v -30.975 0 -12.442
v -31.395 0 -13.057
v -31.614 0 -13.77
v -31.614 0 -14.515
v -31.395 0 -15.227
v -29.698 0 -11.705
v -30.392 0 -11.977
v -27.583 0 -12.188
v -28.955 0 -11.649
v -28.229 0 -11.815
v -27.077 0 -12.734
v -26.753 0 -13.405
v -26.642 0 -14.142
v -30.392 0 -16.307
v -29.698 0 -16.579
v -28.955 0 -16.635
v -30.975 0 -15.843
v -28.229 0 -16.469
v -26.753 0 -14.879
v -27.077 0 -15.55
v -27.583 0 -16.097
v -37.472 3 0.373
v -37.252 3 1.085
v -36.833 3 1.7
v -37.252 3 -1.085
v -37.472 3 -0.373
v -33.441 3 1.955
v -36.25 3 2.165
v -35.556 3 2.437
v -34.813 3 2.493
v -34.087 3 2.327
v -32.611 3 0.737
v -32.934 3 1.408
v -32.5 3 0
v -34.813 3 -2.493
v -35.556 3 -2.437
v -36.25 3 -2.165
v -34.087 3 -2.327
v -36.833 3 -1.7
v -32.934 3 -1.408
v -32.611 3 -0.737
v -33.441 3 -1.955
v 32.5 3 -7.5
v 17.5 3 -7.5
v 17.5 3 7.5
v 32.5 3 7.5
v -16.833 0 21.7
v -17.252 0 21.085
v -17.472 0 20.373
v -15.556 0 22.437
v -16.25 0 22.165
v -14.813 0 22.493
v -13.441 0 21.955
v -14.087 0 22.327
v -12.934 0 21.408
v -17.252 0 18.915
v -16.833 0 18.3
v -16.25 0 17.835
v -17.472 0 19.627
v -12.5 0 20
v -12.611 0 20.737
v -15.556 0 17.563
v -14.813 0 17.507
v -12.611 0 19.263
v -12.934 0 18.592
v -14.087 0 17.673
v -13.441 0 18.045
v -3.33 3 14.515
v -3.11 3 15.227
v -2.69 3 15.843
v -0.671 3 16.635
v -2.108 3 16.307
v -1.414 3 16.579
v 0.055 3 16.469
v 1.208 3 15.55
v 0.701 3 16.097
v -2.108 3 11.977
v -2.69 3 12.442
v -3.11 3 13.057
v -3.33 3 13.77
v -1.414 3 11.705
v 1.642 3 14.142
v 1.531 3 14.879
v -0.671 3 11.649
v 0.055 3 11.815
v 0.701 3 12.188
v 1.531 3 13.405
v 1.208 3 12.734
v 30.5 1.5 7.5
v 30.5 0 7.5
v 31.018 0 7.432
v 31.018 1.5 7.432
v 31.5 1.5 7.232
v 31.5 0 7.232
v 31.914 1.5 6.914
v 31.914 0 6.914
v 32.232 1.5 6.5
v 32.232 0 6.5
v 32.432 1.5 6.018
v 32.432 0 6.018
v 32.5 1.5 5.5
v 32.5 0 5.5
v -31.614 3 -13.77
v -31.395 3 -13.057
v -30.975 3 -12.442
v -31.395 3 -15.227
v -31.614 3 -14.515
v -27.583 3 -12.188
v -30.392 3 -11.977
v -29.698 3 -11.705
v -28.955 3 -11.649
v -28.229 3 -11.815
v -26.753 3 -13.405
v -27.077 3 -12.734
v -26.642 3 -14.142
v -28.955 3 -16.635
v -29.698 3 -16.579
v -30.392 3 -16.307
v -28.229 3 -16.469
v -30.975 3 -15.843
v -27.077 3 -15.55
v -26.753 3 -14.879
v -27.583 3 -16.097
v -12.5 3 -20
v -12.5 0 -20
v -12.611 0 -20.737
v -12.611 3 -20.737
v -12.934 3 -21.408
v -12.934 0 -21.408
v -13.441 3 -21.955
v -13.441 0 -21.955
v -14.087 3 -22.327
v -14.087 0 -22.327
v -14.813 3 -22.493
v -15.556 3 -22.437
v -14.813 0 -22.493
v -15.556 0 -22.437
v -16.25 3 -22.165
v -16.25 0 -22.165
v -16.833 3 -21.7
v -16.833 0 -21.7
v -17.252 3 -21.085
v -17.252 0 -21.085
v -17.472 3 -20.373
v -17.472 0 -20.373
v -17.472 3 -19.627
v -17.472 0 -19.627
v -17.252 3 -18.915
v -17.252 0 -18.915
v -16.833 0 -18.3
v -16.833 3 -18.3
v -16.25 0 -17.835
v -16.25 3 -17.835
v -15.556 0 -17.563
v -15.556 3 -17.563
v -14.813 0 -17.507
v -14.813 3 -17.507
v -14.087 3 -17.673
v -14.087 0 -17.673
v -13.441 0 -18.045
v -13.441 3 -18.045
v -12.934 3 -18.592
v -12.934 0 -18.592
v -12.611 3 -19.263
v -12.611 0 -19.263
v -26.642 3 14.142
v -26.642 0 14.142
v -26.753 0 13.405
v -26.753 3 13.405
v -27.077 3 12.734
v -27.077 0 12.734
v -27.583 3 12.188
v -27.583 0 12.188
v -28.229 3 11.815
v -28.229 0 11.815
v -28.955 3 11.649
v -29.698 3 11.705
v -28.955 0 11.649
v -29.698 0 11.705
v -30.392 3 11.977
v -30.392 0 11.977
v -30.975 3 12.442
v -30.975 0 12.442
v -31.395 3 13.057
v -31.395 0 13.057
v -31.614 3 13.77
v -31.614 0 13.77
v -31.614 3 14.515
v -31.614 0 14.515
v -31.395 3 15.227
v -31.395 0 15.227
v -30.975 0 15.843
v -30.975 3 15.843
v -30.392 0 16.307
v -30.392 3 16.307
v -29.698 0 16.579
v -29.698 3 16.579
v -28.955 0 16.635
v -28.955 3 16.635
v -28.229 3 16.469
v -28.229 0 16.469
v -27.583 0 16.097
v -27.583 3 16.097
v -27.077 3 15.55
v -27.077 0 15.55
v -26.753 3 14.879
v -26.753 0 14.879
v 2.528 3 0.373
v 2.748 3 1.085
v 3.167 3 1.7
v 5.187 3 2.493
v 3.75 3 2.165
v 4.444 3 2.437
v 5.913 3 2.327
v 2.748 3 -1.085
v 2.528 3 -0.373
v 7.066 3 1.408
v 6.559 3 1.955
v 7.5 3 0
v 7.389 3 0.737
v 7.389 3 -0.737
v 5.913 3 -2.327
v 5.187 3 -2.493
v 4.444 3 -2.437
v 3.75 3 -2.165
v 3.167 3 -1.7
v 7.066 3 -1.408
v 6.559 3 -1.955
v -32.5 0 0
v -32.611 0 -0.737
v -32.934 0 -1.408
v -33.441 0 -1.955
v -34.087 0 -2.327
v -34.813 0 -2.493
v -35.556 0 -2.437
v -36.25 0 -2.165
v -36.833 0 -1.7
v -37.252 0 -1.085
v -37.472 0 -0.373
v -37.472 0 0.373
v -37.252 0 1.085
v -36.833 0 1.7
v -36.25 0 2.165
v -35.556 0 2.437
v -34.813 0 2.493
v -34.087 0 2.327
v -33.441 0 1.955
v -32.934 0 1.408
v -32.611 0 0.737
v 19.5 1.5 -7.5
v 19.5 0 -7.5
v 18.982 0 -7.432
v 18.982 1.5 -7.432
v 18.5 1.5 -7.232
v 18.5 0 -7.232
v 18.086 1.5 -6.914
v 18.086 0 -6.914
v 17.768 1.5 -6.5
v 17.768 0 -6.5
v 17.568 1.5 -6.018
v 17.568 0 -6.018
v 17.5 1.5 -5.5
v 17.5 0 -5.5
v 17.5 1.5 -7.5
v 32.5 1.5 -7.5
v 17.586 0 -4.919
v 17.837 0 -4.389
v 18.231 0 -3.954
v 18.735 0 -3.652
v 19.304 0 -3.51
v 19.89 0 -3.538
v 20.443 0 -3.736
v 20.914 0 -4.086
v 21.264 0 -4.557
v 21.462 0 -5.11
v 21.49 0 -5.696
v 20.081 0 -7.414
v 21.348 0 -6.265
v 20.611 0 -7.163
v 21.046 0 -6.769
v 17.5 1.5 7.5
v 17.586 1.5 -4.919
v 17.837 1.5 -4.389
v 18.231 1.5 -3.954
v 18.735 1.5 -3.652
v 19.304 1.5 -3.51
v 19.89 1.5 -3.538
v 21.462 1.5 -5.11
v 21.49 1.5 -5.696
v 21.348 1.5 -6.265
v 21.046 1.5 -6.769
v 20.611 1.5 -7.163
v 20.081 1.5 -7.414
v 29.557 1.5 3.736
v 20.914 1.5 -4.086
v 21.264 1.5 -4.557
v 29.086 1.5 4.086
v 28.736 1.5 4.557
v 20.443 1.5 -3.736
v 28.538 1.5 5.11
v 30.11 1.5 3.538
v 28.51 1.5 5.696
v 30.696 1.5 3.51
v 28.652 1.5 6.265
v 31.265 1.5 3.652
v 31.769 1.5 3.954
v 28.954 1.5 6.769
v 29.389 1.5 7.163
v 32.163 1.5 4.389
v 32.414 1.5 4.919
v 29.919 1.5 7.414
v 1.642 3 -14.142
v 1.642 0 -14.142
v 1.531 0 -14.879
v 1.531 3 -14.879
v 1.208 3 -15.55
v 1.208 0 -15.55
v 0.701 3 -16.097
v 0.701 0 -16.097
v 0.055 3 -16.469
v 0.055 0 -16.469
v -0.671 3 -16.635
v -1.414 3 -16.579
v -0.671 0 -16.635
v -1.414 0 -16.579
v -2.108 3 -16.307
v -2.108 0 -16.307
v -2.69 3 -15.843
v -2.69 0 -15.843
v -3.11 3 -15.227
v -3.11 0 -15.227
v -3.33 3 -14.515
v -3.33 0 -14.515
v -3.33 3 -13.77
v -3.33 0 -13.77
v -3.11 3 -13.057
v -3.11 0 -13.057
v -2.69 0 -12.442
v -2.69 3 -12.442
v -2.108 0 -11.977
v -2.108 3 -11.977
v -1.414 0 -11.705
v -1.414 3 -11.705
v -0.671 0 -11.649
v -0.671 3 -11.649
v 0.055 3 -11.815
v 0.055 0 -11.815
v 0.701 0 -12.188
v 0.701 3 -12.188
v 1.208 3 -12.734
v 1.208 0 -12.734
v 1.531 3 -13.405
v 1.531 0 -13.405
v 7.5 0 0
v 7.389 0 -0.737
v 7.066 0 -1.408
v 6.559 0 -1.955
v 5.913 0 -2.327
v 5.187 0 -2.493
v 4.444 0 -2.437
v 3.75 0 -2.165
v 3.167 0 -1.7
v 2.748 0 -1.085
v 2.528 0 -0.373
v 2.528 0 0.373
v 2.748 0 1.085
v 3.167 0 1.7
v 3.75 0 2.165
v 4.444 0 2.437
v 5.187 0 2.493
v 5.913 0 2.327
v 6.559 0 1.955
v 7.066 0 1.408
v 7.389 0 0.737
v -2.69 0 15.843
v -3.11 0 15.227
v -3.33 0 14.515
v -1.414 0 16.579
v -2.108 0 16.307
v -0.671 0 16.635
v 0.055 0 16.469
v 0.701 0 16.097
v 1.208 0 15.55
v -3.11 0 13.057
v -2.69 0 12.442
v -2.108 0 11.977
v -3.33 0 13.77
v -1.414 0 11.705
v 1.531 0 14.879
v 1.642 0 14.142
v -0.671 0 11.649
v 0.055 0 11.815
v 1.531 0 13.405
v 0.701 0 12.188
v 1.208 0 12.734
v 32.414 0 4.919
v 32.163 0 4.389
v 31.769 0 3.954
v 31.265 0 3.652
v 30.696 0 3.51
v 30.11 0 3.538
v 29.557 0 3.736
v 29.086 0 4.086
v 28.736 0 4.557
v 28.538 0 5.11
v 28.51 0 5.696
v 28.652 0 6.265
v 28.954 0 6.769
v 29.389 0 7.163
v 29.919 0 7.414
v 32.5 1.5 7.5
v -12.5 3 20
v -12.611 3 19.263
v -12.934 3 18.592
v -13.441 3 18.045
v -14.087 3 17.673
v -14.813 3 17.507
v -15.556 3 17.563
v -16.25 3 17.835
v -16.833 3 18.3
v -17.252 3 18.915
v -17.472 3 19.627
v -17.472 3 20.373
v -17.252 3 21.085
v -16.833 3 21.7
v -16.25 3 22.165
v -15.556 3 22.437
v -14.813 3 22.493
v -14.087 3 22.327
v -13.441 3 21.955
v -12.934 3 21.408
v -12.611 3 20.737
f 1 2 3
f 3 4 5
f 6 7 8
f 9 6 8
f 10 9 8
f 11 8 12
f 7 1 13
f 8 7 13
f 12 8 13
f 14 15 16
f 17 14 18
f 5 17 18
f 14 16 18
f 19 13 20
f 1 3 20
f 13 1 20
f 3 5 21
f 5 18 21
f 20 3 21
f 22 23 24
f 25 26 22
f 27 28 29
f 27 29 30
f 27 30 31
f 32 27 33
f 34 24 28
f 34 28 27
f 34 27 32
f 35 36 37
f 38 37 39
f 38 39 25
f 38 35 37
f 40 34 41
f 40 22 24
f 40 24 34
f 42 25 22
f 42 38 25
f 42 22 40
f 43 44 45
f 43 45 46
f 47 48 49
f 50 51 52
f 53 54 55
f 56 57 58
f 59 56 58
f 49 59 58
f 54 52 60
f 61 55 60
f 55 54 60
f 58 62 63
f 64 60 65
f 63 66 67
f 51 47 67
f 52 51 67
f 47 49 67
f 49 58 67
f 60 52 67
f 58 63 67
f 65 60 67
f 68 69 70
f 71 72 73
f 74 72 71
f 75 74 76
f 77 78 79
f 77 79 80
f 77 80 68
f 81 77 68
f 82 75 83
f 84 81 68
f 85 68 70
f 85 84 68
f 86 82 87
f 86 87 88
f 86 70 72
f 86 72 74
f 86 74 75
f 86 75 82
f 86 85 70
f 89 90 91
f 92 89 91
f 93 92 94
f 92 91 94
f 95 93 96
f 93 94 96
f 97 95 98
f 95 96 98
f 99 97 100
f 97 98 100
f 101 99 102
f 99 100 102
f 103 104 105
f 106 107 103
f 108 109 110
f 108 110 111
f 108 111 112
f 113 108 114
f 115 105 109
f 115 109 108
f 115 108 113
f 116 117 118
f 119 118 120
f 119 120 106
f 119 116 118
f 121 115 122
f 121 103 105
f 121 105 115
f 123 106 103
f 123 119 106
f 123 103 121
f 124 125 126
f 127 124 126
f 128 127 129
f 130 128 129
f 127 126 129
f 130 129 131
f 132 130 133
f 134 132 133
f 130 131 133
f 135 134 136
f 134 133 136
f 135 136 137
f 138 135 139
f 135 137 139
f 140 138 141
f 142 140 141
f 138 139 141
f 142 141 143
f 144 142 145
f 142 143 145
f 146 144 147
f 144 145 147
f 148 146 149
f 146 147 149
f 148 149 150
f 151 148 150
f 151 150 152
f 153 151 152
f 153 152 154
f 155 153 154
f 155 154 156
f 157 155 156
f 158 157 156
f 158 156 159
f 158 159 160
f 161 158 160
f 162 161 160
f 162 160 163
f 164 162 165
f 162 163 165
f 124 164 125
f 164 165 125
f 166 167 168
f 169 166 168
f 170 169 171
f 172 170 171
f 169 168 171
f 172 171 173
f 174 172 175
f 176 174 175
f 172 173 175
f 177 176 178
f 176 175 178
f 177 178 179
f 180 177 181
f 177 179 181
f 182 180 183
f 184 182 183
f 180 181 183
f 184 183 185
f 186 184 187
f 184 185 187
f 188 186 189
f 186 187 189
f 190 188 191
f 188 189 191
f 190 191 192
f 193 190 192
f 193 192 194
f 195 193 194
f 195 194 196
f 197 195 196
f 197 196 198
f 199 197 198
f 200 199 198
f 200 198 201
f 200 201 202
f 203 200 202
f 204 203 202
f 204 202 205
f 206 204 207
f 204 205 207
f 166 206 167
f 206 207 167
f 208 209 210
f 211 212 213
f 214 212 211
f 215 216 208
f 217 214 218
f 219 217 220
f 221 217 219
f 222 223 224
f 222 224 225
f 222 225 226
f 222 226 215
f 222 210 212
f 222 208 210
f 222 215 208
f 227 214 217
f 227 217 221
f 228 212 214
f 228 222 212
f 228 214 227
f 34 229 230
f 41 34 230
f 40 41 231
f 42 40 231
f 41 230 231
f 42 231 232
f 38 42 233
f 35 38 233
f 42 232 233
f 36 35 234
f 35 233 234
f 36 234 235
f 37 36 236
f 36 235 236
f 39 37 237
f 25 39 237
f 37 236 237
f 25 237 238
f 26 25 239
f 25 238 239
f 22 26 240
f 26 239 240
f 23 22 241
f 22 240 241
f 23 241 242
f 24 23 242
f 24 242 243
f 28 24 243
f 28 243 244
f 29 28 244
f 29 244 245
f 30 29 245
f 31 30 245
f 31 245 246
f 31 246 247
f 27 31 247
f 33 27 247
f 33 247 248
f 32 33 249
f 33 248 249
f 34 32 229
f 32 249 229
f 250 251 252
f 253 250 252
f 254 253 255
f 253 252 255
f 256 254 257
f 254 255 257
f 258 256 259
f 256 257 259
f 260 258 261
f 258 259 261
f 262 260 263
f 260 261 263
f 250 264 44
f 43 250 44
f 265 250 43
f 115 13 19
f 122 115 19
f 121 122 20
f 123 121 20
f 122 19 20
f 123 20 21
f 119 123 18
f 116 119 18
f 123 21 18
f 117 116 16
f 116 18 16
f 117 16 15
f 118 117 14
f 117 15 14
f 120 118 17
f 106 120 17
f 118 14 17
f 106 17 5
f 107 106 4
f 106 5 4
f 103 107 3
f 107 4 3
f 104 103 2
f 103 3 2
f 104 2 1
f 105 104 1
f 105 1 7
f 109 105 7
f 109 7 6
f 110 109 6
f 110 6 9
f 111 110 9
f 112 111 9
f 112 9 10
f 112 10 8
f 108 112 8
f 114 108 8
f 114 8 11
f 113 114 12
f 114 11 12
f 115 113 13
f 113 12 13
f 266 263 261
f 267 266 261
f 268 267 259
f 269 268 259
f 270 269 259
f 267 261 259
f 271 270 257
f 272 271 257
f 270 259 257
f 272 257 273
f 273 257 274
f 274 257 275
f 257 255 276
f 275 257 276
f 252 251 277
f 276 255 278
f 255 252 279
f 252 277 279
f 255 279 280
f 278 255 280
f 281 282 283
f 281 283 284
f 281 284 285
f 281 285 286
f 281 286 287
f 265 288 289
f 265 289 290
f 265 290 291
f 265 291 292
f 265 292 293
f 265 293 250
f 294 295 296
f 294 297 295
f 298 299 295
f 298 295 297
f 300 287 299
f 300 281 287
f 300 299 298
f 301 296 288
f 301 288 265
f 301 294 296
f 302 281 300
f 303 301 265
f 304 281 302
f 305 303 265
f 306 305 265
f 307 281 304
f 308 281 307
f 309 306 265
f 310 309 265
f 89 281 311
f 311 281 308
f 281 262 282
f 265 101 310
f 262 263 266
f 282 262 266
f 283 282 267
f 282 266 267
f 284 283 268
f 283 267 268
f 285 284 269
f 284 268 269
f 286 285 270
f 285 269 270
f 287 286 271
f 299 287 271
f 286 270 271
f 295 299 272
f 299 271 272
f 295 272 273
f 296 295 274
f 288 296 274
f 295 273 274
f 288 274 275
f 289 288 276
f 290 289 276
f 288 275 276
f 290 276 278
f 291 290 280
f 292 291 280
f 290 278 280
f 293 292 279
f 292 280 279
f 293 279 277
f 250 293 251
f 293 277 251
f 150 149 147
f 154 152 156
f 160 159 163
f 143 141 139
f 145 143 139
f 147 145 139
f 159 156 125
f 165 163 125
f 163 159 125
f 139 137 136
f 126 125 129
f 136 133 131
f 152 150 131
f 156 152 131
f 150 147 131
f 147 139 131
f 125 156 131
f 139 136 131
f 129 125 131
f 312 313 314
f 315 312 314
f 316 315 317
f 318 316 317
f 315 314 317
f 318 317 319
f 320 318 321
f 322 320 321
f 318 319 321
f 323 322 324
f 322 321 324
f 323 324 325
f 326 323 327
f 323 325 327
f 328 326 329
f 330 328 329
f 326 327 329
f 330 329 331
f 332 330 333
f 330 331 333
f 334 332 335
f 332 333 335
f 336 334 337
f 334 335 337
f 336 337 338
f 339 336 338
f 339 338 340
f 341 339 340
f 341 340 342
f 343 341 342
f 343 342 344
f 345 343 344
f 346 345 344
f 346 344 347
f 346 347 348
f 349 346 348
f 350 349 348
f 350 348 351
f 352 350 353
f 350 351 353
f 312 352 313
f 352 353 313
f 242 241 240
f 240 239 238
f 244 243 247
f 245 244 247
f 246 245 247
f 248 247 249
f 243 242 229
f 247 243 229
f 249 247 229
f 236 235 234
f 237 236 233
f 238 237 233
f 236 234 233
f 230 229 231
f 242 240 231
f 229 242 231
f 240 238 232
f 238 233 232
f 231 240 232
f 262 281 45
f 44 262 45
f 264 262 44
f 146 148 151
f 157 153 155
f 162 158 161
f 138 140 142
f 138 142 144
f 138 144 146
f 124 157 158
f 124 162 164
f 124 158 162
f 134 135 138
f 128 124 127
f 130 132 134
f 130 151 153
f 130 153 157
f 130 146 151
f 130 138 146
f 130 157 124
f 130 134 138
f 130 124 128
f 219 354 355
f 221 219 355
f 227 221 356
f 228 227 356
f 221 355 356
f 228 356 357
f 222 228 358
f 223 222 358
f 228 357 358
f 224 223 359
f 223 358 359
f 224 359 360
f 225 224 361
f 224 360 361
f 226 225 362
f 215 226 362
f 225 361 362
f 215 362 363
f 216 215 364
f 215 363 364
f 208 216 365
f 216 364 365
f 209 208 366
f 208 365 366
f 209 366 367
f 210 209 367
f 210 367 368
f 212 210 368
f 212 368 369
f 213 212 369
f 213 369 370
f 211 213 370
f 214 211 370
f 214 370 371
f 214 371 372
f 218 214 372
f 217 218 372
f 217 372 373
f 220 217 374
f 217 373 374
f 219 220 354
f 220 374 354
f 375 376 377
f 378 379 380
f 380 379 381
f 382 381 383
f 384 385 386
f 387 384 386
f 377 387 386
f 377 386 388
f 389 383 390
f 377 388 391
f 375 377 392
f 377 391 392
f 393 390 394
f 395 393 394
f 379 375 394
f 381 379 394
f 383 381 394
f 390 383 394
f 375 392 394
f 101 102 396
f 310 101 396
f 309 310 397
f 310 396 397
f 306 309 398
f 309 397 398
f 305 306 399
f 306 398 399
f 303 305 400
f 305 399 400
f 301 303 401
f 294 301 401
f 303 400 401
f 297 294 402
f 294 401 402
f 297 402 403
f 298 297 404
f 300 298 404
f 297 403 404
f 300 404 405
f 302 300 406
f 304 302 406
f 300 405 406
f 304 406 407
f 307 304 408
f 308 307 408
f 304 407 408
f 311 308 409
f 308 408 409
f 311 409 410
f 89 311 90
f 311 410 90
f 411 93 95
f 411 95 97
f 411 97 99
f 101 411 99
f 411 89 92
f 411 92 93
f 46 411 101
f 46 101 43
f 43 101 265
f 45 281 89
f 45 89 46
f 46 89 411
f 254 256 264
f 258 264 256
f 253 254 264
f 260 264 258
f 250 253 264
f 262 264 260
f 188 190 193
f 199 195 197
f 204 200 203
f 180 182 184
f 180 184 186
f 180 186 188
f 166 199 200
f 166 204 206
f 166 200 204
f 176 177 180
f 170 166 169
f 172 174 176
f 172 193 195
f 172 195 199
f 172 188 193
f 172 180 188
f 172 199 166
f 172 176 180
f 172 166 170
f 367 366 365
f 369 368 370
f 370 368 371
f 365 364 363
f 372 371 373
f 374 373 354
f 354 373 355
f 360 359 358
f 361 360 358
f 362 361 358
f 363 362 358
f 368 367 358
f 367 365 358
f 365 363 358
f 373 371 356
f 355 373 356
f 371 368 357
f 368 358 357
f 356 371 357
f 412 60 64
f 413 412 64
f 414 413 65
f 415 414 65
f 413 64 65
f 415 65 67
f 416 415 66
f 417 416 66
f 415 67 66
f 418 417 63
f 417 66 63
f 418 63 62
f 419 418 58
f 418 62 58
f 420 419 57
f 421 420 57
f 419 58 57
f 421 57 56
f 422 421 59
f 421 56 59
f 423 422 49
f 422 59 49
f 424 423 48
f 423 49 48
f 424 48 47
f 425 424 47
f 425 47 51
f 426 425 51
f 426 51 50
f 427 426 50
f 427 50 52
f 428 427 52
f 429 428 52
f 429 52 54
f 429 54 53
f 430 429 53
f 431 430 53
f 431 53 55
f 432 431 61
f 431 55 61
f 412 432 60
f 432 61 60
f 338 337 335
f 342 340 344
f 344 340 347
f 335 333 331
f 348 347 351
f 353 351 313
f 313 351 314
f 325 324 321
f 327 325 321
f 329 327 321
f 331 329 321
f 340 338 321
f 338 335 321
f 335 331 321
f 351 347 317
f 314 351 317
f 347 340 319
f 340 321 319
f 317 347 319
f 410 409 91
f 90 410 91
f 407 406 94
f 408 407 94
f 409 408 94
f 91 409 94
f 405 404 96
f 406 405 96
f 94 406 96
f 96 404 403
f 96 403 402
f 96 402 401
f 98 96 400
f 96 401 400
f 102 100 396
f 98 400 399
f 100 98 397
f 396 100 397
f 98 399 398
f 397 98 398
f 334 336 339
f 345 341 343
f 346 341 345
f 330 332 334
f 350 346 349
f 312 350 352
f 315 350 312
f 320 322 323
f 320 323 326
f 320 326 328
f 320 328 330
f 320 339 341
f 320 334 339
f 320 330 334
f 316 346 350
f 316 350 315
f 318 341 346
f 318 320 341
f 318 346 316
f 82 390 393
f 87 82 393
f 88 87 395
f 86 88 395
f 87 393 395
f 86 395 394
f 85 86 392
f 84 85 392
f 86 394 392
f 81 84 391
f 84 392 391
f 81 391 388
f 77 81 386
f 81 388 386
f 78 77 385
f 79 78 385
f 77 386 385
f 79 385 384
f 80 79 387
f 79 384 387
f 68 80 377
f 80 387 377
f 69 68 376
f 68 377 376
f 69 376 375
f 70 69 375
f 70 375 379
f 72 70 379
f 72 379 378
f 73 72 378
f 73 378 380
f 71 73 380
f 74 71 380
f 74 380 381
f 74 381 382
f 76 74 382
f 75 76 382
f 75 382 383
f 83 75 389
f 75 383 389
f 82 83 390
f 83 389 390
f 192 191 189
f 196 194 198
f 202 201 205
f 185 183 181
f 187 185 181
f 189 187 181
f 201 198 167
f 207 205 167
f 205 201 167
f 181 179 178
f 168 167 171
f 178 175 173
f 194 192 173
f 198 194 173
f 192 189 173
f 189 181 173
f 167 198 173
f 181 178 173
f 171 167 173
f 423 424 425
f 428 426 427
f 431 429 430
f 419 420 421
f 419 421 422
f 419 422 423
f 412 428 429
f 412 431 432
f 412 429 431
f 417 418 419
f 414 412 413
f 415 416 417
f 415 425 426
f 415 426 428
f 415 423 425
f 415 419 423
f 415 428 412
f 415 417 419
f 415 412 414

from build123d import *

# Parameters (mm, degrees)
SKETCH1_R             = 2.5
BOSS_EXTRUDE3_DEPTH   = 3
BOSS_EXTRUDE3_2_DEPTH = 3
BOSS_EXTRUDE3_3_DEPTH = 3
BOSS_EXTRUDE3_4_DEPTH = 3
BOSS_EXTRUDE3_5_DEPTH = 3
BOSS_EXTRUDE3_6_DEPTH = 3
BOSS_EXTRUDE3_7_DEPTH = 3
BOSS_EXTRUDE3_8_DEPTH = 3
SKETCH1_W             = 15
SKETCH1_H             = 15
BOSS_EXTRUDE3_9_DEPTH = 3
CUT_EXTRUDE1_DEPTH    = 1.5
CUT_EXTRUDE3_DEPTH    = 1.5


with BuildPart() as part:
    # Sketch1 → Boss-Extrude3 (new body)
    with BuildSketch(Plane(origin=(0, 0, 0), x_dir=(1, 0, 0), z_dir=(0, 1, 0))):
        with Locations((-35, 0)):
            Circle(SKETCH1_R)
    extrude(amount=BOSS_EXTRUDE3_DEPTH)


with BuildPart() as body_2:
    # Sketch1 → Boss-Extrude3 2 (new body)
    with BuildSketch(Plane(origin=(0, 0, 0), x_dir=(1, 0, 0), z_dir=(0, 1, 0))):
        with Locations((-29.142135624, 14.142135624)):
            Circle(SKETCH1_R)
    extrude(amount=BOSS_EXTRUDE3_2_DEPTH)


with BuildPart() as body_3:
    # Sketch1 → Boss-Extrude3 3 (new body)
    with BuildSketch(Plane(origin=(0, 0, 0), x_dir=(1, 0, 0), z_dir=(0, 1, 0))):
        with Locations((-15, 20)):
            Circle(SKETCH1_R)
    extrude(amount=BOSS_EXTRUDE3_3_DEPTH)


with BuildPart() as body_4:
    # Sketch1 → Boss-Extrude3 4 (new body)
    with BuildSketch(Plane(origin=(0, 0, 0), x_dir=(1, 0, 0), z_dir=(0, 1, 0))):
        with Locations((-0.857864376, 14.142135624)):
            Circle(SKETCH1_R)
    extrude(amount=BOSS_EXTRUDE3_4_DEPTH)


with BuildPart() as body_5:
    # Sketch1 → Boss-Extrude3 5 (new body)
    with BuildSketch(Plane(origin=(0, 0, 0), x_dir=(1, 0, 0), z_dir=(0, 1, 0))):
        with Locations((5, 0)):
            Circle(SKETCH1_R)
    extrude(amount=BOSS_EXTRUDE3_5_DEPTH)


with BuildPart() as body_6:
    # Sketch1 → Boss-Extrude3 6 (new body)
    with BuildSketch(Plane(origin=(0, 0, 0), x_dir=(1, 0, 0), z_dir=(0, 1, 0))):
        with Locations((-0.857864376, -14.142135624)):
            Circle(SKETCH1_R)
    extrude(amount=BOSS_EXTRUDE3_6_DEPTH)


with BuildPart() as body_7:
    # Sketch1 → Boss-Extrude3 7 (new body)
    with BuildSketch(Plane(origin=(0, 0, 0), x_dir=(1, 0, 0), z_dir=(0, 1, 0))):
        with Locations((-15, -20)):
            Circle(SKETCH1_R)
    extrude(amount=BOSS_EXTRUDE3_7_DEPTH)


with BuildPart() as body_8:
    # Sketch1 → Boss-Extrude3 8 (new body)
    with BuildSketch(Plane(origin=(0, 0, 0), x_dir=(1, 0, 0), z_dir=(0, 1, 0))):
        with Locations((-29.142135624, -14.142135624)):
            Circle(SKETCH1_R)
    extrude(amount=BOSS_EXTRUDE3_8_DEPTH)


with BuildPart() as body_9:
    # Sketch1 → Boss-Extrude3 9 (new body)
    with BuildSketch(Plane(origin=(0, 0, 0), x_dir=(1, 0, 0), z_dir=(0, 1, 0))):
        with Locations((25, 0)):
            Rectangle(SKETCH1_W, SKETCH1_H)
    extrude(amount=BOSS_EXTRUDE3_9_DEPTH)

    # Sketch2 → Cut-Extrude1 (cut)
    with BuildSketch(Plane.XZ):
        with BuildLine():
            Line((30.5, 7.5), (17.5, 7.5))
            Line((17.5, 7.5), (17.5, -5.5))
            ThreePointArc((17.5, -5.5), (20.914213562, -4.085786438), (19.5, -7.5))
            Line((19.5, -7.5), (32.5, -7.5))
            Line((32.5, -7.5), (32.5, 5.5))
            ThreePointArc((32.5, 5.5), (29.085786438, 4.085786438), (30.5, 7.5))
        make_face()
        with BuildLine():
            ThreePointArc((19.5, -7.5), (18.085786438, -6.914213562), (17.5, -5.5))
            Line((17.5, -5.5), (17.5, -7.5))
            Line((17.5, -7.5), (19.5, -7.5))
        make_face()
    extrude(amount=-CUT_EXTRUDE1_DEPTH, mode=Mode.SUBTRACT)

    # Sketch3 → Cut-Extrude3 (cut)
    with BuildSketch(Plane.XZ):
        with BuildLine():
            Line((32.5, 5.5), (32.5, 7.5))
            Line((32.5, 7.5), (30.5, 7.5))
            ThreePointArc((30.5, 7.5), (31.914213562, 6.914213562), (32.5, 5.5))
        make_face()
    extrude(amount=-CUT_EXTRUDE3_DEPTH, mode=Mode.SUBTRACT)


solid = Compound([part.part, body_2.part, body_3.part, body_4.part, body_5.part, body_6.part, body_7.part, body_8.part, body_9.part])
